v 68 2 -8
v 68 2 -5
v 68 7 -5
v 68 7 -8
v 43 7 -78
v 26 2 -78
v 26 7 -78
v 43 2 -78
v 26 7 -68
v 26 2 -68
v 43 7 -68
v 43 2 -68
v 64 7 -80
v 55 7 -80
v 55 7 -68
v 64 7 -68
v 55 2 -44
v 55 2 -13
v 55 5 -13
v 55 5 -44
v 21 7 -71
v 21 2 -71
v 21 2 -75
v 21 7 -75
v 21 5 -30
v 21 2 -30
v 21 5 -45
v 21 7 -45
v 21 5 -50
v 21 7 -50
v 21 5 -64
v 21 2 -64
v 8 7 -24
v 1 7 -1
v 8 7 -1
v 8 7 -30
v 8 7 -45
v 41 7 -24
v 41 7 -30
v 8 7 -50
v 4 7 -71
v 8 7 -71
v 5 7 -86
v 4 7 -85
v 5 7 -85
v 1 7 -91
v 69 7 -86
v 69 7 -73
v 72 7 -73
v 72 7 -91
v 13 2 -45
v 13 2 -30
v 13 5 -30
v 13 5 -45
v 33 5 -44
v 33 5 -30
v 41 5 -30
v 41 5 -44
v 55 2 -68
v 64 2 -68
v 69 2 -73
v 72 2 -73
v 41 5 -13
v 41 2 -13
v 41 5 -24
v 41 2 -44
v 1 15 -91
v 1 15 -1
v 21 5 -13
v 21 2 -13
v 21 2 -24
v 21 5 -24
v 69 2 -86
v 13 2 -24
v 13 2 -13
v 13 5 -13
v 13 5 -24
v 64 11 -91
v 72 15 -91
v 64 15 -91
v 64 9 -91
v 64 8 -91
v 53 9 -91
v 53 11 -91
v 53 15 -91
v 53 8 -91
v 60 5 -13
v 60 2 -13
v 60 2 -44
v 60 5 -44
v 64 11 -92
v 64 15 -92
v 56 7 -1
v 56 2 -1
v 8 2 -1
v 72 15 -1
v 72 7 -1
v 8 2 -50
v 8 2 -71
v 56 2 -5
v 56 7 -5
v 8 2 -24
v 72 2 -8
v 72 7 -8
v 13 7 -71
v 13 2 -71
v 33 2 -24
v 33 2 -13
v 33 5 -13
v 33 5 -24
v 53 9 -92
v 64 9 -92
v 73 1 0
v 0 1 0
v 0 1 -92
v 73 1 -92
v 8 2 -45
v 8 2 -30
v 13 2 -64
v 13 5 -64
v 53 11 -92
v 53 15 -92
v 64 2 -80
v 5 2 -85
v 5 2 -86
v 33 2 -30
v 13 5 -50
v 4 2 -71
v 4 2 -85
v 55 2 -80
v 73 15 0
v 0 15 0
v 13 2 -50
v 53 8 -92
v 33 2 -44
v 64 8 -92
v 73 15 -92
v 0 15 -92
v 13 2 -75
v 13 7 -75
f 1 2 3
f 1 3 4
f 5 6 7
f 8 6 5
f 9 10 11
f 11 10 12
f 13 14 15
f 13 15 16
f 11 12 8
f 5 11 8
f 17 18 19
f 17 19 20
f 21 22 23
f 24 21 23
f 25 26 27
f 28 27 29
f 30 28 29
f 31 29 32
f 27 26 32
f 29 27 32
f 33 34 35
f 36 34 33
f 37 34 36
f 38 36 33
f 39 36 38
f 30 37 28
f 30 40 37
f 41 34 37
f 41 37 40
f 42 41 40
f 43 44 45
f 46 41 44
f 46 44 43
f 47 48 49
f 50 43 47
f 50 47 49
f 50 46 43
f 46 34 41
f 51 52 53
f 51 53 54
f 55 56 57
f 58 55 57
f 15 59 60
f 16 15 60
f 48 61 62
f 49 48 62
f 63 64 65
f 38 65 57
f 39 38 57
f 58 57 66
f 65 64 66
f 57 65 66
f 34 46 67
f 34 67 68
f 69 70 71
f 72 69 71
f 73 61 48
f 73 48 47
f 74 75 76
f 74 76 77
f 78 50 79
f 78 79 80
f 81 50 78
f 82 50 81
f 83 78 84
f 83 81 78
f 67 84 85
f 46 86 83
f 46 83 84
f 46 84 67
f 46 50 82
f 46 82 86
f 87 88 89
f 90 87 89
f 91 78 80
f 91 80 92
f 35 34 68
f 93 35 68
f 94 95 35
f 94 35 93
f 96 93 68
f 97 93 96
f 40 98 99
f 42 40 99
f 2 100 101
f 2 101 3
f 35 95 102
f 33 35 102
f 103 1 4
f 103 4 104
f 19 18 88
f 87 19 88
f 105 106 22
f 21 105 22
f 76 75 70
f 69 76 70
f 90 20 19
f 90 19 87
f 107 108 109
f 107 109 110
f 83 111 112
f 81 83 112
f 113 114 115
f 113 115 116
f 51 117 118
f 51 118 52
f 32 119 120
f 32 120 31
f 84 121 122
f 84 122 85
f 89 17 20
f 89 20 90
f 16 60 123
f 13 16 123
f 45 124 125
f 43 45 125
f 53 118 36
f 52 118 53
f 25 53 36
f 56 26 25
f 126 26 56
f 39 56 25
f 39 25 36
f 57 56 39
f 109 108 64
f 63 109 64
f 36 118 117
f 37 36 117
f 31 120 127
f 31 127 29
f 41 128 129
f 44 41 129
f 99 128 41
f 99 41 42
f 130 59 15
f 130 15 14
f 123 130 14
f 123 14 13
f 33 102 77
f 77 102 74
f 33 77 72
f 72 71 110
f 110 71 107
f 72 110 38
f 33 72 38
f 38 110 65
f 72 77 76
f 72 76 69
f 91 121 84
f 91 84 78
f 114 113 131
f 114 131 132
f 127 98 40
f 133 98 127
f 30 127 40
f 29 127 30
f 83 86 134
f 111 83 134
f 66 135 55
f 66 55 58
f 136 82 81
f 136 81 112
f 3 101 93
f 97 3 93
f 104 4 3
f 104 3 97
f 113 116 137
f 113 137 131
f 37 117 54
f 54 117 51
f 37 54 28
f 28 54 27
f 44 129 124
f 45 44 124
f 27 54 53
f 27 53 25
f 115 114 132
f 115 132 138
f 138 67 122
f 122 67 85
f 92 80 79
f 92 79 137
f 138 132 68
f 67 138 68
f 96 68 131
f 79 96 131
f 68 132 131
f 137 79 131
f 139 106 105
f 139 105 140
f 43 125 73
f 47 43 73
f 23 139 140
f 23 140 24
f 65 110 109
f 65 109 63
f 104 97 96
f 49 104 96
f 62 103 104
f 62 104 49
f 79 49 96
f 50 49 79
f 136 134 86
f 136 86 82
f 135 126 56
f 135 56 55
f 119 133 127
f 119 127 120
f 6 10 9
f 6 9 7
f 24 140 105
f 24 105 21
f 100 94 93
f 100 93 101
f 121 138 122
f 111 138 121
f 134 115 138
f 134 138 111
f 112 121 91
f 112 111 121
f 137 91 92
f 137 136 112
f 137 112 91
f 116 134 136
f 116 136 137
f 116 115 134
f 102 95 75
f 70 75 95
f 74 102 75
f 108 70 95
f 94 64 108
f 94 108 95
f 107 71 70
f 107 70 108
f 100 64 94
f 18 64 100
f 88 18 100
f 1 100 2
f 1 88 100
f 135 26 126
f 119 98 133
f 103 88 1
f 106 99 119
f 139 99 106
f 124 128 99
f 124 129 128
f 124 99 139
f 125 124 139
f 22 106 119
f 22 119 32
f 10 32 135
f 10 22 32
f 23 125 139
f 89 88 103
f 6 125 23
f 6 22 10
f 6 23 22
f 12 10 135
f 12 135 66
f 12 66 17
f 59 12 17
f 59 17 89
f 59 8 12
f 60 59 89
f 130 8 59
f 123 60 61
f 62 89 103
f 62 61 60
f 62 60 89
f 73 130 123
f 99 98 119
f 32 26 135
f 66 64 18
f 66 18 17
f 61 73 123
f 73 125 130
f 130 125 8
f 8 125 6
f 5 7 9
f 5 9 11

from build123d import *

# Parameters (mm, degrees)
SKETCH_8_W           = 73
SKETCH_8_H           = 92
EXTRUDE_5_DEPTH      = 12
SKETCH_9_W           = 71
SKETCH_9_H           = 90
CUT_EXTRUDE_3_DEPTH  = 10
SKETCH_11_W          = 73
SKETCH_11_H          = 6
EXTRUDE_8_DEPTH      = 7
SKETCH_12_W          = 4
SKETCH_12_H          = 19
EXTRUDE_10_DEPTH     = 7
SKETCH_13_W          = 4
SKETCH_13_H          = 21
EXTRUDE_13_DEPTH     = 7
SKETCH_14_W          = 7
SKETCH_14_H          = 12
EXTRUDE_14_DEPTH     = 7
SKETCH_15_W          = 7
SKETCH_15_H          = 58
EXTRUDE_15_DEPTH     = 7
SKETCH_17_W          = 40
SKETCH_17_H          = 6
EXTRUDE_16_DEPTH     = 7
SKETCH_18_W          = 20
SKETCH_18_H          = 5
EXTRUDE_17_DEPTH     = 7
SKETCH_19_W          = 16
SKETCH_19_H          = 4
EXTRUDE_18_DEPTH     = 7
SKETCH_20_W          = 4
SKETCH_20_H          = 7
EXTRUDE_19_DEPTH     = 7
SKETCH_21_W          = 5
SKETCH_21_H          = 31
EXTRUDE_22_DEPTH     = 5
SKETCH_23_W          = 9
SKETCH_23_H          = 12
EXTRUDE_23_DEPTH     = 7
SKETCH_24_W          = 17
SKETCH_24_H          = 10
EXTRUDE_24_DEPTH     = 7
SKETCH_25_W          = 8
SKETCH_25_H          = 4
EXTRUDE_25_DEPTH     = 7
SKETCH_28_W          = 8
SKETCH_28_H          = 31
EXTRUDE_26_DEPTH     = 5
SKETCH_32_W          = 10
SKETCH_32_H          = 1
CUT_EXTRUDE_4_DEPTH  = 5
SKETCH_33_W          = 8
SKETCH_33_H          = 51
EXTRUDE_27_DEPTH     = 5
SKETCH_35_W          = 10
SKETCH_35_H          = 1
EXTRUDE_28_DEPTH     = 10
SKETCH_37_W          = 11
SKETCH_37_H          = 1
CUT_EXTRUDE_7_DEPTH  = 1
SKETCH_39_W          = 11
SKETCH_39_H          = 1
CUT_EXTRUDE_8_DEPTH  = 1
SKETCH_40_W          = 1
SKETCH_40_H          = 1
EXTRUDE_29_DEPTH     = 7
SKETCH_41_R          = 1
CUT_EXTRUDE_9_DEPTH  = 9
EXTRUDE_30_DEPTH     = 4
SKETCH_44_W          = 4
SKETCH_44_H          = 6
SKETCH_44_W_2        = 3
SKETCH_44_H_2        = 5
SKETCH_44_H_3        = 7
SKETCH_44_W_3        = 7
SKETCH_44_H_4        = 7.504780259
EXTRUDE_31_DEPTH     = 7
SKETCH_45_W          = 73
SKETCH_45_H          = 1
CUT_EXTRUDE_10_DEPTH = 100
SKETCH_47_W          = 73
SKETCH_47_H          = 1
CUT_EXTRUDE_11_DEPTH = 100


with BuildPart() as part:
    # 草图8 → 凸台-拉伸5 (new body)
    with BuildSketch(Plane(origin=(0, 0, 0), x_dir=(1, 0, 0), z_dir=(0, 1, 0))):
        with Locations((36.5, 46)):
            Rectangle(SKETCH_8_W, SKETCH_8_H)
    extrude(amount=EXTRUDE_5_DEPTH)

    # 草图9 → 切除-拉伸3 (cut)
    with BuildSketch(Plane(origin=(0, 12, 0), x_dir=(1, 0, 0), z_dir=(0, 1, 0))):
        with Locations((36.5, 46)):
            Rectangle(SKETCH_9_W, SKETCH_9_H)
    extrude(amount=-CUT_EXTRUDE_3_DEPTH, mode=Mode.SUBTRACT)

    # 草图11 → 凸台-拉伸8 (add)
    with BuildSketch(Plane(origin=(0, 0, 0), x_dir=(1, 0, 0), z_dir=(0, 1, 0))):
        with Locations((36.5, 89)):
            Rectangle(SKETCH_11_W, SKETCH_11_H)
    extrude(amount=EXTRUDE_8_DEPTH)

    # 草图12 → 凸台-拉伸10 (add)
    with BuildSketch(Plane(origin=(0, 0, 0), x_dir=(1, 0, 0), z_dir=(0, 1, 0))):
        with Locations((71, 82.5)):
            Rectangle(SKETCH_12_W, SKETCH_12_H)
    extrude(amount=EXTRUDE_10_DEPTH)

    # 草图13 → 凸台-拉伸13 (add)
    with BuildSketch(Plane(origin=(0, 0, 0), x_dir=(1, 0, 0), z_dir=(0, 1, 0))):
        with Locations((2, 81.5)):
            Rectangle(SKETCH_13_W, SKETCH_13_H)
    extrude(amount=EXTRUDE_13_DEPTH)

    # 草图14 → 凸台-拉伸14 (add)
    with BuildSketch(Plane(origin=(0, 0, 0), x_dir=(1, 0, 0), z_dir=(0, 1, 0))):
        with Locations((4.5, 65)):
            Rectangle(SKETCH_14_W, SKETCH_14_H)
    extrude(amount=EXTRUDE_14_DEPTH)

    # 草图15 → 凸台-拉伸15 (add)
    with BuildSketch(Plane(origin=(0, 0, 0), x_dir=(1, 0, 0), z_dir=(0, 1, 0))):
        with Locations((4.5, 30)):
            Rectangle(SKETCH_15_W, SKETCH_15_H)
    extrude(amount=EXTRUDE_15_DEPTH)

    # 草图17 → 凸台-拉伸16 (add)
    with BuildSketch(Plane(origin=(0, 0, 0), x_dir=(1, 0, 0), z_dir=(0, 1, 0))):
        with Locations((21, 27)):
            Rectangle(SKETCH_17_W, SKETCH_17_H)
    extrude(amount=EXTRUDE_16_DEPTH)

    # 草图18 → 凸台-拉伸17 (add)
    with BuildSketch(Plane(origin=(0, 0, 0), x_dir=(1, 0, 0), z_dir=(0, 1, 0))):
        with Locations((11, 47.5)):
            Rectangle(SKETCH_18_W, SKETCH_18_H)
    extrude(amount=EXTRUDE_17_DEPTH)

    # 草图19 → 凸台-拉伸18 (add)
    with BuildSketch(Plane(origin=(0, 0, 0), x_dir=(1, 0, 0), z_dir=(0, 1, 0))):
        with Locations((64, 3)):
            Rectangle(SKETCH_19_W, SKETCH_19_H)
    extrude(amount=EXTRUDE_18_DEPTH)

    # 草图20 → 凸台-拉伸19 (add)
    with BuildSketch(Plane(origin=(0, 0, 0), x_dir=(1, 0, 0), z_dir=(0, 1, 0))):
        with Locations((70, 4.5)):
            Rectangle(SKETCH_20_W, SKETCH_20_H)
    extrude(amount=EXTRUDE_19_DEPTH)

    # 草图21 → 凸台-拉伸22 (add)
    with BuildSketch(Plane(origin=(0, 0, 0), x_dir=(1, 0, 0), z_dir=(0, 1, 0))):
        with Locations((57.5, 28.5)):
            Rectangle(SKETCH_21_W, SKETCH_21_H)
    extrude(amount=EXTRUDE_22_DEPTH)

    # 草图23 → 凸台-拉伸23 (add)
    with BuildSketch(Plane(origin=(0, 0, 0), x_dir=(1, 0, 0), z_dir=(0, 1, 0))):
        with Locations((59.5, 74)):
            Rectangle(SKETCH_23_W, SKETCH_23_H)
    extrude(amount=EXTRUDE_23_DEPTH)

    # 草图24 → 凸台-拉伸24 (add)
    with BuildSketch(Plane(origin=(0, 0, 0), x_dir=(1, 0, 0), z_dir=(0, 1, 0))):
        with Locations((34.5, 73)):
            Rectangle(SKETCH_24_W, SKETCH_24_H)
    extrude(amount=EXTRUDE_24_DEPTH)

    # 草图25 → 凸台-拉伸25 (add)
    with BuildSketch(Plane(origin=(0, 0, 0), x_dir=(1, 0, 0), z_dir=(0, 1, 0))):
        with Locations((17, 73)):
            Rectangle(SKETCH_25_W, SKETCH_25_H)
    extrude(amount=EXTRUDE_25_DEPTH)

    # 草图28 → 凸台-拉伸26 (add)
    with BuildSketch(Plane(origin=(0, 0, 0), x_dir=(1, 0, 0), z_dir=(0, 1, 0))):
        with Locations((37, 28.5)):
            Rectangle(SKETCH_28_W, SKETCH_28_H)
    extrude(amount=EXTRUDE_26_DEPTH)

    # 草图32 → 切除-拉伸4 (cut)
    with BuildSketch(Plane(origin=(0, 12, 0), x_dir=(1, 0, 0), z_dir=(0, 1, 0))):
        with Locations((58, 91.5)):
            Rectangle(SKETCH_32_W, SKETCH_32_H)
    extrude(amount=-CUT_EXTRUDE_4_DEPTH, mode=Mode.SUBTRACT)

    # 草图33 → 凸台-拉伸27 (add)
    with BuildSketch(Plane(origin=(0, 0, 0), x_dir=(1, 0, 0), z_dir=(0, 1, 0))):
        with Locations((17, 38.5)):
            Rectangle(SKETCH_33_W, SKETCH_33_H)
    extrude(amount=EXTRUDE_27_DEPTH)

    # 草图35 → 凸台-拉伸28 (add)
    with BuildSketch(Plane(origin=(0, 12, 0), x_dir=(1, 0, 0), z_dir=(0, 1, 0))):
        with Locations((58, 91.5)):
            Rectangle(SKETCH_35_W, SKETCH_35_H)
    extrude(amount=-EXTRUDE_28_DEPTH)

    # 草图37 → 切除-拉伸7 (cut)
    with BuildSketch(Plane(origin=(0, 12, 0), x_dir=(1, 0, 0), z_dir=(0, 1, 0))):
        with Locations((58.5, 91.5)):
            Rectangle(SKETCH_37_W, SKETCH_37_H)
    extrude(amount=-CUT_EXTRUDE_7_DEPTH, mode=Mode.SUBTRACT)

    # 草图39 → 切除-拉伸8 (cut)
    with BuildSketch(Plane(origin=(0, 8, 0), x_dir=(1, 0, 0), z_dir=(0, 1, 0))):
        with Locations((58.5, 91.5)):
            Rectangle(SKETCH_39_W, SKETCH_39_H)
    extrude(amount=CUT_EXTRUDE_8_DEPTH, mode=Mode.SUBTRACT)

    # 草图40 → 凸台-拉伸29 (add)
    with BuildSketch(Plane(origin=(0, 0, 0), x_dir=(1, 0, 0), z_dir=(0, 1, 0))):
        with Locations((4.5, 85.5)):
            Rectangle(SKETCH_40_W, SKETCH_40_H)
    extrude(amount=EXTRUDE_29_DEPTH)

    # 草图41 → 切除-拉伸9 (cut)
    with BuildSketch(Plane(origin=(0, 12, 0), x_dir=(1, 0, 0), z_dir=(0, 1, 0))):
        with Locations((4, 5)):
            Circle(SKETCH_41_R)
        with Locations((70, 6)):
            Circle(SKETCH_41_R)
        with Locations((70, 87)):
            Circle(SKETCH_41_R)
        with Locations((4, 87)):
            Circle(SKETCH_41_R)
    extrude(amount=-CUT_EXTRUDE_9_DEPTH, mode=Mode.SUBTRACT)

    # 草图42 → 凸台-拉伸30 (add)
    with BuildSketch(Plane(origin=(0, 12, 0), x_dir=(1, 0, 0), z_dir=(0, 1, 0))):
        Polygon((53, 92), (53, 91), (1, 91), (1, 1), (72, 1), (72, 91), (64, 91), (64, 92), (73, 92), (73, 0), (0, 0), (0, 92), align=None)
    extrude(amount=EXTRUDE_30_DEPTH)

    # 草图44 → 凸台-拉伸31 (add)
    with BuildSketch(Plane(origin=(0, 0, 0), x_dir=(1, 0, 0), z_dir=(0, 1, 0))):
        with Locations((3, 88)):
            Rectangle(SKETCH_44_W, SKETCH_44_H)
        with Locations((70.5, 88.5)):
            Rectangle(SKETCH_44_W_2, SKETCH_44_H_2)
        with Locations((70, 4.5)):
            Rectangle(SKETCH_44_W, SKETCH_44_H_3)
        with Locations((4.5, 4.75239013)):
            Rectangle(SKETCH_44_W_3, SKETCH_44_H_4)
    extrude(amount=EXTRUDE_31_DEPTH)

    # 草图45 → 切除-拉伸10 (cut)
    with BuildSketch(Plane.XY):
        with Locations((36.5, 0.5)):
            Rectangle(SKETCH_45_W, SKETCH_45_H)
    extrude(amount=-CUT_EXTRUDE_10_DEPTH, mode=Mode.SUBTRACT)

    # 草图47 → 切除-拉伸11 (cut)
    with BuildSketch(Plane.XY):
        with Locations((36.5, 15.5)):
            Rectangle(SKETCH_47_W, SKETCH_47_H)
    extrude(amount=-CUT_EXTRUDE_11_DEPTH, mode=Mode.SUBTRACT)


solid = part.part
